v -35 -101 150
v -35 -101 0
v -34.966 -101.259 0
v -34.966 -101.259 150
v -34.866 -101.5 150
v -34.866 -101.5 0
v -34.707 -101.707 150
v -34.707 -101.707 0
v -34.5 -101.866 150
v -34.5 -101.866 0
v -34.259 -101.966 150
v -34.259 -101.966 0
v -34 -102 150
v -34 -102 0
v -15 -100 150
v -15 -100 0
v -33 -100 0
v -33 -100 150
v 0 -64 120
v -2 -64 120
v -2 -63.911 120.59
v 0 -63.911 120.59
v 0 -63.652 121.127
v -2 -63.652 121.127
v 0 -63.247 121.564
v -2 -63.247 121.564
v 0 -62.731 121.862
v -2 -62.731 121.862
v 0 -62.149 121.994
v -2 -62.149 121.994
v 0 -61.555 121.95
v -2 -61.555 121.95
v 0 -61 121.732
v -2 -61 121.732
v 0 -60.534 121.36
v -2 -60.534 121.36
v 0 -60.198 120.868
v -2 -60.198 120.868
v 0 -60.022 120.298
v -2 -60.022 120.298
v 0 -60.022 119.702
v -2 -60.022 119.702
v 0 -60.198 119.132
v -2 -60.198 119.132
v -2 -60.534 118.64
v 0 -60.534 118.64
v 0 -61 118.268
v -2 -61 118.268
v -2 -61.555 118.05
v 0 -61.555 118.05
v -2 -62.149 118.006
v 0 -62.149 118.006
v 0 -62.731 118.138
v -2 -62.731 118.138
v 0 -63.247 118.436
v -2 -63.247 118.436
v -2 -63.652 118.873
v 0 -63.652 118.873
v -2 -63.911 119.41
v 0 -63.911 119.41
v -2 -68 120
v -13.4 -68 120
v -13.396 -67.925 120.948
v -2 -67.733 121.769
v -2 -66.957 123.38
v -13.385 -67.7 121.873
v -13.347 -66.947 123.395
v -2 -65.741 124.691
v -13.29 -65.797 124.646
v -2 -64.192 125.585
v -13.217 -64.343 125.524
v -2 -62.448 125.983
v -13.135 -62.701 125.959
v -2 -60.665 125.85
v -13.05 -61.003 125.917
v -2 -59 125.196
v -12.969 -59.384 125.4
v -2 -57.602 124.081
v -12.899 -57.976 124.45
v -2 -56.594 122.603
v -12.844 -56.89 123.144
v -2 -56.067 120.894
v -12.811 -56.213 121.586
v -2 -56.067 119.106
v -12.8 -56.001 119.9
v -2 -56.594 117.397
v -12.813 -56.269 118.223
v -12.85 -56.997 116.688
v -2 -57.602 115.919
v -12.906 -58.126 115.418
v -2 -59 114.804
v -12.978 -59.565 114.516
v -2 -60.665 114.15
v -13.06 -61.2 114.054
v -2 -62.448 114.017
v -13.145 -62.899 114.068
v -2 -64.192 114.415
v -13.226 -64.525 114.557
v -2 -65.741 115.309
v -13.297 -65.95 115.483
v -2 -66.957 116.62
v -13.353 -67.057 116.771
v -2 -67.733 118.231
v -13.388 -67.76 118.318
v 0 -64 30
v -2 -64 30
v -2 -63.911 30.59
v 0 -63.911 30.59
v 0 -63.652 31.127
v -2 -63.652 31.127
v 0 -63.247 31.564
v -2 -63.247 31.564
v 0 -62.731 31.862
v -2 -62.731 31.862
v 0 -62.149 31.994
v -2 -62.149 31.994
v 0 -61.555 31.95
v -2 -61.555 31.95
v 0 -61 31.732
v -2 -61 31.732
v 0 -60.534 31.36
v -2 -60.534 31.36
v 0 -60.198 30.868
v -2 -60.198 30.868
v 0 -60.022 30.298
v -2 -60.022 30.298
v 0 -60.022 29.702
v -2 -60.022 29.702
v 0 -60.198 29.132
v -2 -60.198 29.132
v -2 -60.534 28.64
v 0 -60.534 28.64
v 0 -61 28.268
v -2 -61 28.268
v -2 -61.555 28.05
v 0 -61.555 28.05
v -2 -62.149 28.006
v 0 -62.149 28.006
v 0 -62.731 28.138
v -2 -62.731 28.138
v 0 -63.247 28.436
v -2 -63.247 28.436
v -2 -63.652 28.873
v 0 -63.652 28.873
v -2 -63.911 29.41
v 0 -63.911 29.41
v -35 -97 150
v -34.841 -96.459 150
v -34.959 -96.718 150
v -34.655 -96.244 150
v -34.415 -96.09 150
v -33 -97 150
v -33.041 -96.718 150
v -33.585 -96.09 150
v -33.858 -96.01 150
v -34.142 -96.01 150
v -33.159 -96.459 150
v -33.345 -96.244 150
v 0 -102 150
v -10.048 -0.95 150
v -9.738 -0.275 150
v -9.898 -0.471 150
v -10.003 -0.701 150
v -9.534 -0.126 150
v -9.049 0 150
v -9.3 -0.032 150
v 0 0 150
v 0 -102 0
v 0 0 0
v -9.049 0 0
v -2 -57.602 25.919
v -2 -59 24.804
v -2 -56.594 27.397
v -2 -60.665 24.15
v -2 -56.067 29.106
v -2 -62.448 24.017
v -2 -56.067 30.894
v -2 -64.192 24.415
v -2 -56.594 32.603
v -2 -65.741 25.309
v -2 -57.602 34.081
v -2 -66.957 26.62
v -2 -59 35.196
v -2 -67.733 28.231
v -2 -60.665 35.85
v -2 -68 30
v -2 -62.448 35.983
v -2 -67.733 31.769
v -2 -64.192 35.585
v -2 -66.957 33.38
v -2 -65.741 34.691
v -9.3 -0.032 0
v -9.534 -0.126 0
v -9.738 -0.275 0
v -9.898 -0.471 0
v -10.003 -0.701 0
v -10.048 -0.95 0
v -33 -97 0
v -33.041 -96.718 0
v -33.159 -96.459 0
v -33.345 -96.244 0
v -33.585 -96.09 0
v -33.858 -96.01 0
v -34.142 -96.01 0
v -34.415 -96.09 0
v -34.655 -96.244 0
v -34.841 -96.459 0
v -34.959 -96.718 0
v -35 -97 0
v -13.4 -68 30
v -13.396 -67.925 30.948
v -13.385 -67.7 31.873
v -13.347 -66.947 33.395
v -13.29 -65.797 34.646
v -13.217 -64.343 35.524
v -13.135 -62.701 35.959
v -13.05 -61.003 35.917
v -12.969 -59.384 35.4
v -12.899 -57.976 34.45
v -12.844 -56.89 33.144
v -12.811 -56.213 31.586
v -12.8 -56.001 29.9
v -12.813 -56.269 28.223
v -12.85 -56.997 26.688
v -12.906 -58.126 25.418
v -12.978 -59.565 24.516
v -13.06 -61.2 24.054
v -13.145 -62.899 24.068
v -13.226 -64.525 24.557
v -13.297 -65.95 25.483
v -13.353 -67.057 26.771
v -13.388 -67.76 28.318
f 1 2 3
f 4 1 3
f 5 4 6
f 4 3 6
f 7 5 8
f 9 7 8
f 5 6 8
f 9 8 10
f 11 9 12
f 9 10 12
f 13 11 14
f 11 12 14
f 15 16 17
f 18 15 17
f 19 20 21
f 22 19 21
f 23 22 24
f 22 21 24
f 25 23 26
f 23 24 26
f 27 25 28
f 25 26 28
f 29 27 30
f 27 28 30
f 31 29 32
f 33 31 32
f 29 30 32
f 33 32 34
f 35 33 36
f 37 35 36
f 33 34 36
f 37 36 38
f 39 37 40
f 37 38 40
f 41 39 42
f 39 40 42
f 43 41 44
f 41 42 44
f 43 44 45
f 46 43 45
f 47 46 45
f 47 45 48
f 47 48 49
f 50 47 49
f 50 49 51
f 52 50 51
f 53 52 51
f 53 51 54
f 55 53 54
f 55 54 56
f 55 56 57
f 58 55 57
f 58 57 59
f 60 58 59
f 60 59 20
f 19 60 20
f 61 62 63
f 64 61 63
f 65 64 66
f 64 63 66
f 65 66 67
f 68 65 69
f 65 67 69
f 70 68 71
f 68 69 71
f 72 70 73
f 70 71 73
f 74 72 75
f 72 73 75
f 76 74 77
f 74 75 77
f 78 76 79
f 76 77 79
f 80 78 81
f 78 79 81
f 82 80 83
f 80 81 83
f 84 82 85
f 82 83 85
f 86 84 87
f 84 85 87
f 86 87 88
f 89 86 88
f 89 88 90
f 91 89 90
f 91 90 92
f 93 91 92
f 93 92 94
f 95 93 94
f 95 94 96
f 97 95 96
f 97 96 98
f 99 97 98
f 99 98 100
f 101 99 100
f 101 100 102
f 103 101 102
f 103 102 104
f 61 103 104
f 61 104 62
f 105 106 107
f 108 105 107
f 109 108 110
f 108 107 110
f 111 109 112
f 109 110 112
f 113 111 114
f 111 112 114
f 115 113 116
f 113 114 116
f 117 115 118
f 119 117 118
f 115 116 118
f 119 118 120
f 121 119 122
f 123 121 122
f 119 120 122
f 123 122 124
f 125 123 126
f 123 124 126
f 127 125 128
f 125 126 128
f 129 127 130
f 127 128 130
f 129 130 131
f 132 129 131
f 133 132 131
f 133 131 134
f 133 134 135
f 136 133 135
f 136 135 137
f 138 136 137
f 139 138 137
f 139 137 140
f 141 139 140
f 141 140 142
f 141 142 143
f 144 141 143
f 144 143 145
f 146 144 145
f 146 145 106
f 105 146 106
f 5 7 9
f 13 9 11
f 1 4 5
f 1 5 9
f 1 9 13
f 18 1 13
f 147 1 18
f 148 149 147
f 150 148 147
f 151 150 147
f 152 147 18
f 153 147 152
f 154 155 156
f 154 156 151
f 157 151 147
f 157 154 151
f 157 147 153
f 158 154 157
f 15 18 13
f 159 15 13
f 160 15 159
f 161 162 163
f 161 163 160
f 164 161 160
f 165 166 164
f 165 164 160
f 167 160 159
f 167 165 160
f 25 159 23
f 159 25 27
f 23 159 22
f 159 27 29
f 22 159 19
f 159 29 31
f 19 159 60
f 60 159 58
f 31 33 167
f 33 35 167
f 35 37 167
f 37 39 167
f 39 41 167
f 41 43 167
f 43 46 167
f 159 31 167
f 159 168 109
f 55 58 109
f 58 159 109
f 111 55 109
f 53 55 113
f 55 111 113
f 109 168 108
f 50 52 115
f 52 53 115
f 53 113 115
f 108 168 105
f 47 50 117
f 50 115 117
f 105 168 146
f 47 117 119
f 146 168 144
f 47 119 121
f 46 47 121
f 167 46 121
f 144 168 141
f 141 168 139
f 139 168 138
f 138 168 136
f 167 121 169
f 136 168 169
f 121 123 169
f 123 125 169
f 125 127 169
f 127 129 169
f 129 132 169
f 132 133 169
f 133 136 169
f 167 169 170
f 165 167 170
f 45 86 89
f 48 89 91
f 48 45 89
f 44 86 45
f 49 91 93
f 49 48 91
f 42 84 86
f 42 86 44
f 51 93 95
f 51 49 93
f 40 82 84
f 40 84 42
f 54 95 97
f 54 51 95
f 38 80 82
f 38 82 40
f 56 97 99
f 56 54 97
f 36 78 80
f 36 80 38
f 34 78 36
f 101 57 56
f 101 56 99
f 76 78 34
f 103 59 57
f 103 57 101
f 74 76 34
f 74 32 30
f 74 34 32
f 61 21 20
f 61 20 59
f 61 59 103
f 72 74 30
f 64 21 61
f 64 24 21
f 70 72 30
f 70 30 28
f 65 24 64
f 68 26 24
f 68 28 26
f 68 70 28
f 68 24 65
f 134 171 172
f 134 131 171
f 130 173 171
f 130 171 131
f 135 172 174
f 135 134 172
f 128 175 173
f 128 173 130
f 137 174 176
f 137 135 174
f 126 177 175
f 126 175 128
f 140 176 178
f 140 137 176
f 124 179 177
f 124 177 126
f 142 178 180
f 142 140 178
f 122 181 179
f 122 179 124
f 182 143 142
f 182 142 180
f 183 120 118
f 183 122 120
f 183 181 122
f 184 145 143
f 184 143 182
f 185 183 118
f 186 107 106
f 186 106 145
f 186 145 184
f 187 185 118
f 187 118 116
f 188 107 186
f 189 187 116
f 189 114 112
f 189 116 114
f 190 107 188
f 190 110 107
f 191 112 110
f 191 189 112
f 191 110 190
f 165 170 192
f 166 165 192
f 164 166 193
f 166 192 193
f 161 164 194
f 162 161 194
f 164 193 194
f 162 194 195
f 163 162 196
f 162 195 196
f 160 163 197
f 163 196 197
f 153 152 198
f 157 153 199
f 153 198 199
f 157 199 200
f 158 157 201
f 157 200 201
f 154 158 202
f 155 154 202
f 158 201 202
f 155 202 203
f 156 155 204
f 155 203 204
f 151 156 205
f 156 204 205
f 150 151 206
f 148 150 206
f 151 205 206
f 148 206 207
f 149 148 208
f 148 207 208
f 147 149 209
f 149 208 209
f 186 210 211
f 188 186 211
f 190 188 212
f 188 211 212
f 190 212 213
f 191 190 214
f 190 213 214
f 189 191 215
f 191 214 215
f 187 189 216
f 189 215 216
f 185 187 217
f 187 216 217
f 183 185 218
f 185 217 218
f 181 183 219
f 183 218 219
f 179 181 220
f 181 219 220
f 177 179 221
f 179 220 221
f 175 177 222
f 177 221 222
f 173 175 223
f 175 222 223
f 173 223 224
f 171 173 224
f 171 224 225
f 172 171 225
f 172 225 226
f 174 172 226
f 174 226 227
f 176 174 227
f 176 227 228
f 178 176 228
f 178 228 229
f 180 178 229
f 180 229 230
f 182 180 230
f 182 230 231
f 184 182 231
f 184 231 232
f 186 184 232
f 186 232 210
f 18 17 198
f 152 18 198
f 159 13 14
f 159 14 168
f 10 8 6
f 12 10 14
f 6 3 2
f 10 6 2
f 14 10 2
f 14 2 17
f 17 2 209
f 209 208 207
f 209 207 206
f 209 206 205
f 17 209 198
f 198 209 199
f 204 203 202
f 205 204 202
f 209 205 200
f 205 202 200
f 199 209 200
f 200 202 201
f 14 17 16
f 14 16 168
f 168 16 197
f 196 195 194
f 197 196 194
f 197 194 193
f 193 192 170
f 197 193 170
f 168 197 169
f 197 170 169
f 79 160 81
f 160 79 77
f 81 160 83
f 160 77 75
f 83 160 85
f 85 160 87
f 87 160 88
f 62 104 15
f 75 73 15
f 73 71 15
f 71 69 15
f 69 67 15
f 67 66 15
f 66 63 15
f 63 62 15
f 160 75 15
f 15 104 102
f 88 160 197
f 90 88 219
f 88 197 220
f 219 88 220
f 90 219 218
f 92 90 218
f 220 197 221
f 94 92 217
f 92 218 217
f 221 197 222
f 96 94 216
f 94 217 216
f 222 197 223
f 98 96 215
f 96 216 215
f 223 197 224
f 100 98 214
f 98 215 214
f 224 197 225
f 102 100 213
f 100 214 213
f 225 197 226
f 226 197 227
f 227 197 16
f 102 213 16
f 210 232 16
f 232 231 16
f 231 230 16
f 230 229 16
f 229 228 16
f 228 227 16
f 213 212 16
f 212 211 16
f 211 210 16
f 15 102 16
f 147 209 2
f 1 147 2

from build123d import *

# Parameters (mm, degrees)
PAD_DEPTH       = 150
SKETCH001_R     = 6
POCKET_DEPTH    = 18
SKETCH002_R     = 2
POCKET001_DEPTH = 2.001


with BuildPart() as part:
    # Sketch → Pad (new body)
    with BuildSketch(Plane.XY):
        with BuildLine():
            Line((0, 0), (-9.048751, 0))
            ThreePointArc((-9.048751, 0), (-9.737976, -0.275453), (-10.047503, -0.950062))
            Line((-10.047503, -0.950062), (-15, -100))
            Line((-15, -100), (-33, -100))
            Line((-33, -100), (-33, -97))
            ThreePointArc((-33, -97), (-34, -96), (-35, -97))
            Line((-35, -97), (-35, -101))
            ThreePointArc((-35, -101), (-34.707107, -101.707107), (-34, -102))
            Line((-34, -102), (0, -102))
            Line((0, -102), (0, 0))
        make_face()
    extrude(amount=PAD_DEPTH)

    # Sketch001 (on Face10 of Pad) → Pocket (cut)
    with BuildSketch(Plane(origin=(-20, 0, 0), x_dir=(0, -1, 0), z_dir=(-1, 0, 0))):
        with Locations((62, 30)):
            Circle(SKETCH001_R)
        with Locations((62, 120)):
            Circle(SKETCH001_R)
    extrude(amount=-POCKET_DEPTH, mode=Mode.SUBTRACT)

    # Sketch002 (on Face15 of Pocket) → Pocket001 (cut, through all)
    with BuildSketch(Plane(origin=(-2, 0, 0), x_dir=(0, -1, 0), z_dir=(-1, 0, 0))):
        with Locations((62, 120)):
            Circle(SKETCH002_R)
        with Locations((62, 30)):
            Circle(SKETCH002_R)
    extrude(amount=-POCKET001_DEPTH, mode=Mode.SUBTRACT)


solid = part.part
